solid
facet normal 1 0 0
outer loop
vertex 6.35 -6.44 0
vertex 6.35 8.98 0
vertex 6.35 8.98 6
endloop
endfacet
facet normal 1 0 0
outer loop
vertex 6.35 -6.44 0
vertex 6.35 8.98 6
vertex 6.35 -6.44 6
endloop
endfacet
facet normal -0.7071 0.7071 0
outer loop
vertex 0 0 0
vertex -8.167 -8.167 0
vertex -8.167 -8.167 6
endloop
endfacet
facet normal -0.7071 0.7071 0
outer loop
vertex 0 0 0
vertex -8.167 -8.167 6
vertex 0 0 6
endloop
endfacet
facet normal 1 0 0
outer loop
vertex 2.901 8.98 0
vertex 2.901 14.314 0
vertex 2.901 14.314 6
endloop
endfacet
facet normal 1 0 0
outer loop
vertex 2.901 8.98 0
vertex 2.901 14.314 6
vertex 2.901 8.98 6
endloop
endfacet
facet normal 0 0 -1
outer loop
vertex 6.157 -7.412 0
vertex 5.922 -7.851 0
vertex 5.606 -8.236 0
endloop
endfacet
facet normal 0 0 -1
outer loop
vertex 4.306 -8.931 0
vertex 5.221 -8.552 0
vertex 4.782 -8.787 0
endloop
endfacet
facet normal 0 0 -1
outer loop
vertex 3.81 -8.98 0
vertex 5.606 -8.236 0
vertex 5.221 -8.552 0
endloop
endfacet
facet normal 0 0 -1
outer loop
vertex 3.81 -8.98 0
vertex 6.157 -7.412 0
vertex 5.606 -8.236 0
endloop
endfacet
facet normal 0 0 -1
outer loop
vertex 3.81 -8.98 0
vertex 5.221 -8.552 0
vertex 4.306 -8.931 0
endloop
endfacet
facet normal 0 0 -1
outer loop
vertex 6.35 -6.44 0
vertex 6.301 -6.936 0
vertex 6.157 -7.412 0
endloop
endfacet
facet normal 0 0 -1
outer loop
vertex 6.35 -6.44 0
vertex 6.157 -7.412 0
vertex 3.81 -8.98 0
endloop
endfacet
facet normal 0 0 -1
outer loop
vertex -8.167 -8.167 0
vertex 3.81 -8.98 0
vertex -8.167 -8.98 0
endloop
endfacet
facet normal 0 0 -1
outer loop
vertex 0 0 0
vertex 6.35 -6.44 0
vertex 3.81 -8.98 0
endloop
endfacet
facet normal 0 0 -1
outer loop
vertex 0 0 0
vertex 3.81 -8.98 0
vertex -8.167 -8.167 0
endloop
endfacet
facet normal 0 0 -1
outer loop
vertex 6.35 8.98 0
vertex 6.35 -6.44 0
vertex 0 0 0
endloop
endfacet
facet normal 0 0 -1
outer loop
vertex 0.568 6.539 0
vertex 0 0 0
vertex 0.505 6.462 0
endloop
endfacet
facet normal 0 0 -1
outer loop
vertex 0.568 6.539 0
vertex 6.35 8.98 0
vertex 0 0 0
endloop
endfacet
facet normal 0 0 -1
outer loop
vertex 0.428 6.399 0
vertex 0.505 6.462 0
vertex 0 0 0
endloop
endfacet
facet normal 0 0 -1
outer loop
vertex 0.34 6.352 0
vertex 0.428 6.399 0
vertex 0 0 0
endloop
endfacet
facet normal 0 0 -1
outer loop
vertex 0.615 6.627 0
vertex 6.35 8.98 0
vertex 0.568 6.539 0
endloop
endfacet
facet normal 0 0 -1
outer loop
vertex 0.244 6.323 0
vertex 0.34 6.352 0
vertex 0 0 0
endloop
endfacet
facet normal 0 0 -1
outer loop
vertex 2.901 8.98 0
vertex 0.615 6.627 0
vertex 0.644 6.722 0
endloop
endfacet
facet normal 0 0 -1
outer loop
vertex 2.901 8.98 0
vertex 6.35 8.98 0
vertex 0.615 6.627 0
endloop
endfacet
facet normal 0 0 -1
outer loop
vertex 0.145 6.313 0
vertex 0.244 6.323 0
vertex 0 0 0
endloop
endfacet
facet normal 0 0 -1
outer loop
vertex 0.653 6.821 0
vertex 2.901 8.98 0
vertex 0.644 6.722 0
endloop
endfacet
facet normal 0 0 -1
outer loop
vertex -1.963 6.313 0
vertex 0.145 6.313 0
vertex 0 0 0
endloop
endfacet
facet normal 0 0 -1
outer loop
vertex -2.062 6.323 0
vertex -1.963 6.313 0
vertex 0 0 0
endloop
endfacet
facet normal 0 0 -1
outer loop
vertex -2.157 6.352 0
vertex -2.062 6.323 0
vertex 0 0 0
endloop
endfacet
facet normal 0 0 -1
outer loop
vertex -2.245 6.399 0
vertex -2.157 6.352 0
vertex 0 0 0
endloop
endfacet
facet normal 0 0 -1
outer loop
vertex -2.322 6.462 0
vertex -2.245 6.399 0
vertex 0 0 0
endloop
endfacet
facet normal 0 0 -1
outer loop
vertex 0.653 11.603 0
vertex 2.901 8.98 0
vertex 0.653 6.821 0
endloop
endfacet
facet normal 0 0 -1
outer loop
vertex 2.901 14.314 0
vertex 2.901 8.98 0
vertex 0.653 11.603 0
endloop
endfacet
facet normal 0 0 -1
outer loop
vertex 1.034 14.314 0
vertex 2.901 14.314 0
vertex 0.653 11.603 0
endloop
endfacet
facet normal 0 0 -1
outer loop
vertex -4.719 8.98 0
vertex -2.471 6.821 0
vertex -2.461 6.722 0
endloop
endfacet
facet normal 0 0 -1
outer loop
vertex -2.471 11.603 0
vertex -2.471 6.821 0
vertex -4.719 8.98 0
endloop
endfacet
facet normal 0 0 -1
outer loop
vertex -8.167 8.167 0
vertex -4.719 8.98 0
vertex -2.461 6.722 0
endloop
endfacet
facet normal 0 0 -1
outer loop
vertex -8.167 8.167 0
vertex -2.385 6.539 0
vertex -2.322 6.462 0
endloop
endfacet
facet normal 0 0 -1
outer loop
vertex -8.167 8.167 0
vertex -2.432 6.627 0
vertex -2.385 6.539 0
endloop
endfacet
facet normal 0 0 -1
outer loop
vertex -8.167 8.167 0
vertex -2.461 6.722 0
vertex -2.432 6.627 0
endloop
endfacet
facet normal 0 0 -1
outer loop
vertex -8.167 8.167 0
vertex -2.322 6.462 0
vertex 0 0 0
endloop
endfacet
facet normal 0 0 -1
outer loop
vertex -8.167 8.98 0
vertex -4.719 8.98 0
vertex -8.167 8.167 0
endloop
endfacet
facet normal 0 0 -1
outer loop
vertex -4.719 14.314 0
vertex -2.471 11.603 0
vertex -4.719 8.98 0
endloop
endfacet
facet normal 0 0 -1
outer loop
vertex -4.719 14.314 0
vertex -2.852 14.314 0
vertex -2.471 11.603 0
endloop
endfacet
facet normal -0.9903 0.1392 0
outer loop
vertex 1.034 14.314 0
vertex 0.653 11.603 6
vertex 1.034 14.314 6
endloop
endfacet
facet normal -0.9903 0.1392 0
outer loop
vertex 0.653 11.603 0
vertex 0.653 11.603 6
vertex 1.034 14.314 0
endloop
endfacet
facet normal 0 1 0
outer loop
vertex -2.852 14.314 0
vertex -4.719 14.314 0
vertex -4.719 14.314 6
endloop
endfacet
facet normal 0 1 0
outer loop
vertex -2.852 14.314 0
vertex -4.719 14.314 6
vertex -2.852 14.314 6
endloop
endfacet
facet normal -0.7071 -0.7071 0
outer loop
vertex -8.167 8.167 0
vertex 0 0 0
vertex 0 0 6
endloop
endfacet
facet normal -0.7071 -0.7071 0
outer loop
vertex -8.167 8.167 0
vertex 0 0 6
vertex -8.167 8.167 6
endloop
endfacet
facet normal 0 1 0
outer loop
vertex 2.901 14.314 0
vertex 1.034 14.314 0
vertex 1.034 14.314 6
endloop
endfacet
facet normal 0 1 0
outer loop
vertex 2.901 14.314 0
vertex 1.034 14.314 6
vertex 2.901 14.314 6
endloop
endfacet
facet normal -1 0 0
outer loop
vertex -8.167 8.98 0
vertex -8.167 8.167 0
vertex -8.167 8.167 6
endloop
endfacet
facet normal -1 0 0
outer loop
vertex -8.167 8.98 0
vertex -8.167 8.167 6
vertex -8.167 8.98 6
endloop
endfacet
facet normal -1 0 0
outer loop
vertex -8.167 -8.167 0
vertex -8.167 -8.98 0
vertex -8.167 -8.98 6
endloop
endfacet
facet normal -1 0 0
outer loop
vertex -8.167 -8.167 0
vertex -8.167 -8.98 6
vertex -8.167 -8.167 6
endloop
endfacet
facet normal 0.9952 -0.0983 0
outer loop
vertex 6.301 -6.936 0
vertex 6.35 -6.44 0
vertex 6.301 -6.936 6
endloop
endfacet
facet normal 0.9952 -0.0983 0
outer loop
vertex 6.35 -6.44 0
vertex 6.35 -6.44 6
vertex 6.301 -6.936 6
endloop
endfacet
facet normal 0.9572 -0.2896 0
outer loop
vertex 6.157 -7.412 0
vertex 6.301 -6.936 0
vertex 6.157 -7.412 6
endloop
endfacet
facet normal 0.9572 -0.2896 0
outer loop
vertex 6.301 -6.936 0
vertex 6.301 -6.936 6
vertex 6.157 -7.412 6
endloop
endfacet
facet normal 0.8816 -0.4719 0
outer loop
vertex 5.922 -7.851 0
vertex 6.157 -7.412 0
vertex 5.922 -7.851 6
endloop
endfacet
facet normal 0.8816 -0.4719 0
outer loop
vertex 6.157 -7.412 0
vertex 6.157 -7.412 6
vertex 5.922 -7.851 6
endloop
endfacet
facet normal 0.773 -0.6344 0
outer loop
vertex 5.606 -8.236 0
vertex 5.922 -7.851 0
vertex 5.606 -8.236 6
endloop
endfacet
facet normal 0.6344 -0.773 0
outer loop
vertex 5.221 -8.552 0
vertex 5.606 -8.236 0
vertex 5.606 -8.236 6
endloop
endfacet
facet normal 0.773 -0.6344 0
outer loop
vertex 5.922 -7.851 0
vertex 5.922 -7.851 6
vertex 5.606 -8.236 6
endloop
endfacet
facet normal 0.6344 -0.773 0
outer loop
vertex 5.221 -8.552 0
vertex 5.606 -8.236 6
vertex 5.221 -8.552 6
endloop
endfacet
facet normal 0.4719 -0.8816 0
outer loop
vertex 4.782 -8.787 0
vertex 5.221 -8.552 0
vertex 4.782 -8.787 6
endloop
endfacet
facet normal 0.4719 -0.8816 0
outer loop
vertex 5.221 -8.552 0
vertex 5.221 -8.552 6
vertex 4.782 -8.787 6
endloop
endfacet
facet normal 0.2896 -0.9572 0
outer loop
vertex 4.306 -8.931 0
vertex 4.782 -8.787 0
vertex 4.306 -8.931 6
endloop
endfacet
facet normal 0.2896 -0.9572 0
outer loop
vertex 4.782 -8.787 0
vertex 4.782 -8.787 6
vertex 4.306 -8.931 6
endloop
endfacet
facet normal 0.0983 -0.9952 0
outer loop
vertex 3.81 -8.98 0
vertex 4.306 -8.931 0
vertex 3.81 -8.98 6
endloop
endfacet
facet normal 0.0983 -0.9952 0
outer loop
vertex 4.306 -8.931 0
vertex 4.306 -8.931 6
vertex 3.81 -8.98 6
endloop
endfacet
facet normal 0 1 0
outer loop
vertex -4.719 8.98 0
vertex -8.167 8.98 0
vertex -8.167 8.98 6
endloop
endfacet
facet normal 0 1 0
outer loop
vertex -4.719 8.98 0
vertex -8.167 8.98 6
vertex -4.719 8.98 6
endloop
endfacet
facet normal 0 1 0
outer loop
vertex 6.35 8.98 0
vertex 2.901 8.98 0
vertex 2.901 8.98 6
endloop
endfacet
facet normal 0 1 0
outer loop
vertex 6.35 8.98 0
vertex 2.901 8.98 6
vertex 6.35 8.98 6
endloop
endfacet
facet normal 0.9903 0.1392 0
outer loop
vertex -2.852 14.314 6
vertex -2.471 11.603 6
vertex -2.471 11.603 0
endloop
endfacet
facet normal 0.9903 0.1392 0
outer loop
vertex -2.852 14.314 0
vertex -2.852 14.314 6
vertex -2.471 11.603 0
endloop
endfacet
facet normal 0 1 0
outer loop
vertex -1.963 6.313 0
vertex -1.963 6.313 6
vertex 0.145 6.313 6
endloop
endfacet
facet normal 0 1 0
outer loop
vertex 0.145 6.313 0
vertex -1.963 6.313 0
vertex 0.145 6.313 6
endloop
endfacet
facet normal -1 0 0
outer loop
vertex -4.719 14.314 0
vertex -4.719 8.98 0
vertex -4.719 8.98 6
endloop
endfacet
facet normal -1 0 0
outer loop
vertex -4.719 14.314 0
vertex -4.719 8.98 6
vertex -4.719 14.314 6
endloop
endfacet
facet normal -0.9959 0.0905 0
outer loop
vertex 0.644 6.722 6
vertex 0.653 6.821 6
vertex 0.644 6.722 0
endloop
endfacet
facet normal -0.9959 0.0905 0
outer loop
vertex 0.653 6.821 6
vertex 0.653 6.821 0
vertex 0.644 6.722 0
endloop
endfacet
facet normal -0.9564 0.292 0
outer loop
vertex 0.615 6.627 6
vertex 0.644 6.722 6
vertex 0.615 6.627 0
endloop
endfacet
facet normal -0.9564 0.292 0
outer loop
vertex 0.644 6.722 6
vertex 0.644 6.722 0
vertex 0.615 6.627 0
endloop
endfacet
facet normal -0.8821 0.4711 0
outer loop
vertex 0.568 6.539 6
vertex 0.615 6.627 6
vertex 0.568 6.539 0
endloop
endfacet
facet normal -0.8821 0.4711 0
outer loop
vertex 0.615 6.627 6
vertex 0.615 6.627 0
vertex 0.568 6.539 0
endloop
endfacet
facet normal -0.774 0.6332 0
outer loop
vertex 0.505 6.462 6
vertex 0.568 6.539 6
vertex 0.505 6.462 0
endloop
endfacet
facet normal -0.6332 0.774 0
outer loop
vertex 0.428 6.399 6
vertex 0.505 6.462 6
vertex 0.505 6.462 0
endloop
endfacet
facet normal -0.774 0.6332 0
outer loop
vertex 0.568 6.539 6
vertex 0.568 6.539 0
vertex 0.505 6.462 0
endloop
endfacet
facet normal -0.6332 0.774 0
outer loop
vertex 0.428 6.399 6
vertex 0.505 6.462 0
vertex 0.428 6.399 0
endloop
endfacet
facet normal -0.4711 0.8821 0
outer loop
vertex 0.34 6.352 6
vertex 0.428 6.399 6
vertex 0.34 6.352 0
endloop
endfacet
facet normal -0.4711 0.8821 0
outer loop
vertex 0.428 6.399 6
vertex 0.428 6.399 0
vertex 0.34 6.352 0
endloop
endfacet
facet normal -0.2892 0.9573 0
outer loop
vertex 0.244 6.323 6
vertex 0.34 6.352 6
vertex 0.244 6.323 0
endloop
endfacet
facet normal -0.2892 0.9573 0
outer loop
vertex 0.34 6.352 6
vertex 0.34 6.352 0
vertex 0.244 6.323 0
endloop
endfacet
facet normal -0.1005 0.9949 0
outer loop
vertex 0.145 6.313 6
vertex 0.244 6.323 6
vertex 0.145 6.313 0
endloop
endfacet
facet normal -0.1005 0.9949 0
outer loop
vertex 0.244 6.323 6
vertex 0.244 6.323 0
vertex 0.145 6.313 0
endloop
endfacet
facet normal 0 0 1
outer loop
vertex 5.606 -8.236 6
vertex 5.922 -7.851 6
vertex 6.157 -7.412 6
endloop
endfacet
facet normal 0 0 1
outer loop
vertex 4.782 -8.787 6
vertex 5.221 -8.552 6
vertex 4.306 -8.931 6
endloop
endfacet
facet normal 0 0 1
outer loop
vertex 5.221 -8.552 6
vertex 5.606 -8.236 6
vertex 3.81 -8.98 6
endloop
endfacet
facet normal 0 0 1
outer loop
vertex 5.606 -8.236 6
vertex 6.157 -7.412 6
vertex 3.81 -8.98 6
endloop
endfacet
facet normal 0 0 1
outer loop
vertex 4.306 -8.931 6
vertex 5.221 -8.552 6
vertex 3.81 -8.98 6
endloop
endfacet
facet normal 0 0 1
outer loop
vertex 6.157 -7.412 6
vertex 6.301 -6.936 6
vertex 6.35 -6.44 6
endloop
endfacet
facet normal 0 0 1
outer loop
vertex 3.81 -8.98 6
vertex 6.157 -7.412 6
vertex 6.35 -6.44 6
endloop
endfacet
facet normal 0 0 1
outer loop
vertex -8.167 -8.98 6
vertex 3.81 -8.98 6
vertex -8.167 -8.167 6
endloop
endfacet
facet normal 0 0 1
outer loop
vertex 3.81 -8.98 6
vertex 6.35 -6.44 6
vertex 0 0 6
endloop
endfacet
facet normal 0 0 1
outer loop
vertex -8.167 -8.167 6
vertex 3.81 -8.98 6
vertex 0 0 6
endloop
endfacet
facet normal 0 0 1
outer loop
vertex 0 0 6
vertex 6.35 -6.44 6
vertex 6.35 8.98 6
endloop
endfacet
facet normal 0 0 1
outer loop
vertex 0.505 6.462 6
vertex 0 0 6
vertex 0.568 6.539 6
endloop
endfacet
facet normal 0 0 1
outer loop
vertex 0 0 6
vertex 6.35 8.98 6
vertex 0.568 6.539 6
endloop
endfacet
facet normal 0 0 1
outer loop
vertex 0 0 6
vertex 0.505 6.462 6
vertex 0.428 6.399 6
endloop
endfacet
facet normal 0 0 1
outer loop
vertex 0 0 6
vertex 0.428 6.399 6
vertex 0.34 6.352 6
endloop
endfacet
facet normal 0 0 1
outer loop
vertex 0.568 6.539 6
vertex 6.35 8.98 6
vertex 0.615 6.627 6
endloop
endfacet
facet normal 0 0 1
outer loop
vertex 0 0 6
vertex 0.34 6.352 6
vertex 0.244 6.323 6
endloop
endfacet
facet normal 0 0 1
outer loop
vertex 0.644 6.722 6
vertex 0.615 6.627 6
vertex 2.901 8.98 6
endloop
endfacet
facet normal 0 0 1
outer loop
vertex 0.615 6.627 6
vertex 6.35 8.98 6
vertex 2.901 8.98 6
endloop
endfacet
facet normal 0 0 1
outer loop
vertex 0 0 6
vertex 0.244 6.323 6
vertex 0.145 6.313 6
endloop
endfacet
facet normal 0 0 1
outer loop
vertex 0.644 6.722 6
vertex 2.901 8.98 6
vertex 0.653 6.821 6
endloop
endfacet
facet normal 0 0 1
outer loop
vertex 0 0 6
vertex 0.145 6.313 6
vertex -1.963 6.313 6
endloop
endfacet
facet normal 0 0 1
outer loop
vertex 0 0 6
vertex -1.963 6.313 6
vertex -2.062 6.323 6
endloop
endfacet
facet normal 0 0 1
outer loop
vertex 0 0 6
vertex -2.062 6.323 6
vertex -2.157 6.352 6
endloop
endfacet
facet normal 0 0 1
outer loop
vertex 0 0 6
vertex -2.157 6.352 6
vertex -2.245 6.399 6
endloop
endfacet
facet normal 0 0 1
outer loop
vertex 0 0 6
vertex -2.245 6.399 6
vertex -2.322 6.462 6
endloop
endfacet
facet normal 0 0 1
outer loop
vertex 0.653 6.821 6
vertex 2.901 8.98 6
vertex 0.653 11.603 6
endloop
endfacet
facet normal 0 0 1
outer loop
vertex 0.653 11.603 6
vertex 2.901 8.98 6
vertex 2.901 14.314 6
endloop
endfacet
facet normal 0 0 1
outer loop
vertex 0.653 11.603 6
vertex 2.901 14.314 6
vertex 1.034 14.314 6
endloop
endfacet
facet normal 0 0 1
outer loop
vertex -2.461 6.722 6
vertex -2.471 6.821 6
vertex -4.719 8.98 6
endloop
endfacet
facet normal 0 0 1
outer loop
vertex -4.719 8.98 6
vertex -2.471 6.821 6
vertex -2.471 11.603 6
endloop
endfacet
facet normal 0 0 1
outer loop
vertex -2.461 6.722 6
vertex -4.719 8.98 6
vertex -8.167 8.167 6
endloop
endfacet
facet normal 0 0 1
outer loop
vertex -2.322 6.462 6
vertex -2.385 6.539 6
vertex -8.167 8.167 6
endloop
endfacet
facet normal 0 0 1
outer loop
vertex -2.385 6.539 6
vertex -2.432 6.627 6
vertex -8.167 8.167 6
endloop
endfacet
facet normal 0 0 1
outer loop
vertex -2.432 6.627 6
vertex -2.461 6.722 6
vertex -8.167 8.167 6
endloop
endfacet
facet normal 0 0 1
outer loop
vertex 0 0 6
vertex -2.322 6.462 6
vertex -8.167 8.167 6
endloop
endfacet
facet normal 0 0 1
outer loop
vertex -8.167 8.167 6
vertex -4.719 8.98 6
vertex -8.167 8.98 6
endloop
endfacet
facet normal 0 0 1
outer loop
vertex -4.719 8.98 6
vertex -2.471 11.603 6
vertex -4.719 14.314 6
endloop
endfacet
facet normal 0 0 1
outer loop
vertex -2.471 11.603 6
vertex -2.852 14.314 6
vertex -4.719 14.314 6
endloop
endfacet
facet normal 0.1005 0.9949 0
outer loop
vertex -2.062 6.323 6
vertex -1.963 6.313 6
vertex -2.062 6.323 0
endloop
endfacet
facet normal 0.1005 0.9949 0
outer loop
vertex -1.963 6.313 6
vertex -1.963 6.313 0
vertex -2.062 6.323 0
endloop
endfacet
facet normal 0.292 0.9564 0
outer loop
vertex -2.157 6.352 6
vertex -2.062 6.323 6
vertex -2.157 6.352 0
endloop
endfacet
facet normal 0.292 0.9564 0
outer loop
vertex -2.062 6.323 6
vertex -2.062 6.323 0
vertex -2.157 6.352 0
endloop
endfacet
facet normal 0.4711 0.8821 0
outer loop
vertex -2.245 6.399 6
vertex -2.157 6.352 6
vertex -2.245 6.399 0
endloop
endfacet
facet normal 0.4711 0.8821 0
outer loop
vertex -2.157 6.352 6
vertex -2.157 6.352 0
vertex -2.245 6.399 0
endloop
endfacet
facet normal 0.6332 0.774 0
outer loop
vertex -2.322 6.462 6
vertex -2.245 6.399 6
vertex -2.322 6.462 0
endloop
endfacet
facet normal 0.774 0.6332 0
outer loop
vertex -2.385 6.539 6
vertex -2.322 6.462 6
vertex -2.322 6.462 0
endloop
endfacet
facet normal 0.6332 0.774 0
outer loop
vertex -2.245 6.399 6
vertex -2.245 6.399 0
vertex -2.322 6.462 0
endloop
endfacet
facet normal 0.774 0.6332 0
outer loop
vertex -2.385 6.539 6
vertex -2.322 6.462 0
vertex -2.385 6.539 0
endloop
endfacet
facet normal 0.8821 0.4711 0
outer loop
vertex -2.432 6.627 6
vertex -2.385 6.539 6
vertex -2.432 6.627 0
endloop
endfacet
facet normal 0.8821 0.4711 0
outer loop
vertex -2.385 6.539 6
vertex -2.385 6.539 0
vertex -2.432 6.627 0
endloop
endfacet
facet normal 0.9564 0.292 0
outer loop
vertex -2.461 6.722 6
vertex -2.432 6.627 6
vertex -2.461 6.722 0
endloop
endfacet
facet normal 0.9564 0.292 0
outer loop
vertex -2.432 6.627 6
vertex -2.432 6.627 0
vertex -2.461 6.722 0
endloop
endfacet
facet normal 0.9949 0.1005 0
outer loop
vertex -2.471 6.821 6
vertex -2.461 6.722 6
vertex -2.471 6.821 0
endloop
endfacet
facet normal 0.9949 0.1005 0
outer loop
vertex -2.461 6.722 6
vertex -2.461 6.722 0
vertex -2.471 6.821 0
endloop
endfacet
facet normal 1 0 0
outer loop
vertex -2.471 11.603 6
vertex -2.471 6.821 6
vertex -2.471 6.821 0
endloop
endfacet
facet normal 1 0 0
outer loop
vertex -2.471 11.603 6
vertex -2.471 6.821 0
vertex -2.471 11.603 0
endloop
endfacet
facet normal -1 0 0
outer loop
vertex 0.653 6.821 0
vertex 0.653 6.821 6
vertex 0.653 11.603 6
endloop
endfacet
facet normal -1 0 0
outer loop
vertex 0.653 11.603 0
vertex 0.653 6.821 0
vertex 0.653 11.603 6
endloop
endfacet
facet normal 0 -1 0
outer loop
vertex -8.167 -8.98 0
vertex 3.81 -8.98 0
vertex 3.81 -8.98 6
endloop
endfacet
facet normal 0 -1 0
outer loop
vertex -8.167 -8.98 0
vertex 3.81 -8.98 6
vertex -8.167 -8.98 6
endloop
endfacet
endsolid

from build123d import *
from OCP.BRepFilletAPI import BRepFilletAPI_MakeChamfer

# Parameters (mm, degrees)
BOSS_EXTRUDE1_DEPTH = 6
FILLET1_R           = 2.54
SKETCH2_W           = 3.1242
SKETCH2_H           = 8.001
CUT_EXTRUDE1_DEPTH  = 18.538679192
CHAMFER1_SIZE       = 0.381
CHAMFER1_SIZE2      = 2.710955864
FILLET2_R           = 0.508


with BuildPart() as part:
    # Sketch1 → Boss-Extrude1 (new body)
    with BuildSketch(Plane.XY):
        Polygon((0, 0), (-8.167456121, 8.167456121), (-8.167456121, 8.980256121), (-4.718728061, 8.980256121), (-4.718728061, 14.314256121), (2.901271939, 14.314256121), (2.901271939, 8.980256121), (6.35, 8.980256121), (6.35, -8.980256121), (-8.167456121, -8.980256121), (-8.167456121, -8.167456121), align=None)
    extrude(amount=BOSS_EXTRUDE1_DEPTH)

    # Fillet1
    fillet1_edges = [part.edges().sort_by_distance(p)[0] for p in [
        (6.35, -8.980256121, 3),
    ]]
    fillet(fillet1_edges, radius=FILLET1_R)

    # Sketch2 → Cut-Extrude1 (cut, through all)
    with BuildSketch(Plane.XY.offset(6)):
        with Locations((-0.908728061, 10.313756121)):
            Rectangle(SKETCH2_W, SKETCH2_H)
    extrude(amount=-CUT_EXTRUDE1_DEPTH, mode=Mode.SUBTRACT)

    # Chamfer1: one chamfer whose edges measure the first distance from different faces: ONE call of the kernel's chamfer builder (chamfer() names one face for all edges)
    chamfer1_edges_1 = [part.edges().sort_by_distance(p)[0] for p in [
        (-2.470828061, 14.314256121, 3),
    ]]
    chamfer1_side_1 = [part.faces().sort_by_distance(p)[0] for p in [
        (-3.594778061, 14.314256121, 3),
    ]]
    chamfer1_edges_2 = [part.edges().sort_by_distance(p)[0] for p in [
        (0.653371939, 14.314256121, 3),
    ]]
    chamfer1_side_2 = [part.faces().sort_by_distance(p)[0] for p in [
        (1.777321939, 14.314256121, 3),
    ]]
    chamfer1 = BRepFilletAPI_MakeChamfer(part.part.solid().wrapped)
    for e in chamfer1_edges_1:
        chamfer1.Add(CHAMFER1_SIZE, CHAMFER1_SIZE2, e.wrapped, chamfer1_side_1[0].wrapped)  # the first distance lies on this face
    for e in chamfer1_edges_2:
        chamfer1.Add(CHAMFER1_SIZE, CHAMFER1_SIZE2, e.wrapped, chamfer1_side_2[0].wrapped)  # the first distance lies on this face
    add(Compound.cast(chamfer1.Shape()), mode=Mode.REPLACE)

    # Fillet2
    fillet2_edges = [part.edges().sort_by_distance(p)[0] for p in [
        (-2.470828061, 6.313256121, 3),
        (0.653371939, 6.313256121, 3),
    ]]
    fillet(fillet2_edges, radius=FILLET2_R)


solid = part.part
